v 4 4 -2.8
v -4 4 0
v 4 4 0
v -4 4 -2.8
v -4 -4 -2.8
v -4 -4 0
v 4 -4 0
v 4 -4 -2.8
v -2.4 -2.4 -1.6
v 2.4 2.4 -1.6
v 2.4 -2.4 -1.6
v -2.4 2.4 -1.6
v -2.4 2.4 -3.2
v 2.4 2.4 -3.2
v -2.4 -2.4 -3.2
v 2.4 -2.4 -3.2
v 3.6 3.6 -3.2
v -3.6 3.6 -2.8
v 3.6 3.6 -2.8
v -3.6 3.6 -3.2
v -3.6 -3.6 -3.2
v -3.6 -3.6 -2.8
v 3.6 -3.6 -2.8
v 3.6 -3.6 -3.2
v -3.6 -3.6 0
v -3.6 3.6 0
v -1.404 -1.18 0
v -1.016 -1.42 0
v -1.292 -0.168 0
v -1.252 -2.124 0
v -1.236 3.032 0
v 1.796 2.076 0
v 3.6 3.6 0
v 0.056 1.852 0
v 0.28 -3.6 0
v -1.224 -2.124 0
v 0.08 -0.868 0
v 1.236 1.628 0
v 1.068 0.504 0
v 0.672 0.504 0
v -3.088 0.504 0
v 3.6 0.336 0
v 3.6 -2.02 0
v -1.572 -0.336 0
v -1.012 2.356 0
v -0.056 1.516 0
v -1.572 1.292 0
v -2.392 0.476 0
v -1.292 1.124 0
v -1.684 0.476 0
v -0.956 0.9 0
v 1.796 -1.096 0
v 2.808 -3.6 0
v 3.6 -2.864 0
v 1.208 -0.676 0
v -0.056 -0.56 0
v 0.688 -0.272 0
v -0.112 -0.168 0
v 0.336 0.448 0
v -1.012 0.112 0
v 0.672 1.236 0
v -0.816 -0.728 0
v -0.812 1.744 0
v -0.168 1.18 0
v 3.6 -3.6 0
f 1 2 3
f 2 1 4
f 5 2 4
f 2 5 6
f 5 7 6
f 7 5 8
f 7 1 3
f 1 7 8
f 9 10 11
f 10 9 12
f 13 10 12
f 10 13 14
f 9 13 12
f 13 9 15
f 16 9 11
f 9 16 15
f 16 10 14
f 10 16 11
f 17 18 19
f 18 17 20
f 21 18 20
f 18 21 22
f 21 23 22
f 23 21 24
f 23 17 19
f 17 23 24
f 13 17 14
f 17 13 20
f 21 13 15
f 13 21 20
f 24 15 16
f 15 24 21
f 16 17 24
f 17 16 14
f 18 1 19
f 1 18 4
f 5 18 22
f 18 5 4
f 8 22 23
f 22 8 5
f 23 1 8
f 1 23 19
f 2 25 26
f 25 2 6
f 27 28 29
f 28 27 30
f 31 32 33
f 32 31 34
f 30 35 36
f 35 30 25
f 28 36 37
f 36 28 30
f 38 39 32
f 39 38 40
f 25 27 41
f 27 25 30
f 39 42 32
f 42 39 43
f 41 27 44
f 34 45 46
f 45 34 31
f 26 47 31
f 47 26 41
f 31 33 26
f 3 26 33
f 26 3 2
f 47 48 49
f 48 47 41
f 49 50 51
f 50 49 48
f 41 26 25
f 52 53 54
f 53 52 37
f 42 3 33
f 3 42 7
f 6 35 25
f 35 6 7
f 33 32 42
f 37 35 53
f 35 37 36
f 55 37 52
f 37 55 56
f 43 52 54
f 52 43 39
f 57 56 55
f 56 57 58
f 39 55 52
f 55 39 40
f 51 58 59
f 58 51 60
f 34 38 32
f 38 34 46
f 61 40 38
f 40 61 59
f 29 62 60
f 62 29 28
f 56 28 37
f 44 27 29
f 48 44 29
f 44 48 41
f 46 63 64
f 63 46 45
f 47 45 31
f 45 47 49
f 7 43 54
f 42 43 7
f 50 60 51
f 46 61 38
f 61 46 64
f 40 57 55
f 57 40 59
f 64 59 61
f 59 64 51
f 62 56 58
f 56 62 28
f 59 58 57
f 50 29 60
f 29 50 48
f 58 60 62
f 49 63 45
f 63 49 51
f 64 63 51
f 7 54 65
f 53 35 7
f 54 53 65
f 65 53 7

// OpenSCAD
// file: ../p/4-4edge.scad
use <../lib.scad>
$fa=1; $fs=0.2;
function ldraw_lib__4_4edge(realsolid=false) = [
// 0 Circle 1.0
// 0 Name: 4-4edge.dat
// 0 Author: James Jessiman
// 0 !LDRAW_ORG Primitive UPDATE 2017-01
// 0 !LICENSE Licensed under CC BY 2.0 and CC BY 4.0 : see CAreadme.txt
// 
// 0 BFC CERTIFY CCW
  [0,"BFC","CERTIFY"],
  [0,"BFC","CCW"],
// 
// 0 !HISTORY 1998-12-15 [PTadmin] Official Update 1998-10
// 0 !HISTORY 2005-12-28 [PTadmin] Official Update 2005-01
// 0 !HISTORY 2007-06-24 [PTadmin] Header formatted for Contributor Agreement
// 0 !HISTORY 2008-07-01 [PTadmin] Official Update 2008-01
// 0 !HISTORY 2017-01-15 [Steffen] BFCed
// 0 !HISTORY 2017-12-30 [PTadmin] Official Update 2017-01
// 
// 
// 2 24 1 0 0 0.9239 0 0.3827
  [2,24,1,0,0,0.9239,0,0.3827],
// 2 24 0.9239 0 0.3827 0.7071 0 0.7071
  [2,24,0.9239,0,0.3827,0.7071,0,0.7071],
// 2 24 0.7071 0 0.7071 0.3827 0 0.9239
  [2,24,0.7071,0,0.7071,0.3827,0,0.9239],
// 2 24 0.3827 0 0.9239 0 0 1
  [2,24,0.3827,0,0.9239,0,0,1],
// 2 24 0 0 1 -0.3827 0 0.9239
  [2,24,0,0,1,-0.3827,0,0.9239],
// 2 24 -0.3827 0 0.9239 -0.7071 0 0.7071
  [2,24,-0.3827,0,0.9239,-0.7071,0,0.7071],
// 2 24 -0.7071 0 0.7071 -0.9239 0 0.3827
  [2,24,-0.7071,0,0.7071,-0.9239,0,0.3827],
// 2 24 -0.9239 0 0.3827 -1 0 -0
  [2,24,-0.9239,0,0.3827,-1,0,-0],
// 2 24 -1 0 -0 -0.9239 0 -0.3827
  [2,24,-1,0,-0,-0.9239,0,-0.3827],
// 2 24 -0.9239 0 -0.3827 -0.7071 0 -0.7071
  [2,24,-0.9239,0,-0.3827,-0.7071,0,-0.7071],
// 2 24 -0.7071 0 -0.7071 -0.3827 0 -0.9239
  [2,24,-0.7071,0,-0.7071,-0.3827,0,-0.9239],
// 2 24 -0.3827 0 -0.9239 0 0 -1
  [2,24,-0.3827,0,-0.9239,0,0,-1],
// 2 24 0 0 -1 0.3827 0 -0.9239
  [2,24,0,0,-1,0.3827,0,-0.9239],
// 2 24 0.3827 0 -0.9239 0.7071 0 -0.7071
  [2,24,0.3827,0,-0.9239,0.7071,0,-0.7071],
// 2 24 0.7071 0 -0.7071 0.9239 0 -0.3827
  [2,24,0.7071,0,-0.7071,0.9239,0,-0.3827],
// 2 24 0.9239 0 -0.3827 1 0 0
  [2,24,0.9239,0,-0.3827,1,0,0],
];
module ldraw_lib__4_4edge(step=0, col=false, unit=2/5, alt=false, line=0.2, solid=!$preview)
    makepoly(ldraw_lib__4_4edge(solid), step=step, col=col, unit=unit, alt=alt, line=line, solid=solid);
ldraw_lib__4_4edge(line=0.2);
// file: ../p/4-4disc.scad
use <../lib.scad>
$fa=1; $fs=0.2;
function ldraw_lib__4_4disc(realsolid=false) = [
// 0 Disc 1.0
// 0 Name: 4-4disc.dat
// 0 Author: James Jessiman
// 0 !LDRAW_ORG Primitive UPDATE 2002-02
// 0 !LICENSE Licensed under CC BY 2.0 and CC BY 4.0 : see CAreadme.txt
// 
// 0 BFC CERTIFY CCW
  [0,"BFC","CERTIFY"],
  [0,"BFC","CCW"],
// 
// 0 !HISTORY 1998-12-15 [PTadmin] Official Update 1998-10
// 0 !HISTORY 2002-03-23 [sbliss] Added BFC statement
// 0 !HISTORY 2002-04-25 [PTadmin] Official Update 2002-02
// 0 !HISTORY 2007-06-24 [PTadmin] Header formatted for Contributor Agreement
// 0 !HISTORY 2008-07-01 [PTadmin] Official Update 2008-01
// 
// 
// 3 16 0 0 0 1 0 0 0.9239 0 0.3827
  [3,16,0,0,0,1,0,0,0.9239,0,0.3827],
// 3 16 0 0 0 0.9239 0 0.3827 0.7071 0 0.7071
  [3,16,0,0,0,0.9239,0,0.3827,0.7071,0,0.7071],
// 3 16 0 0 0 0.7071 0 0.7071 0.3827 0 0.9239
  [3,16,0,0,0,0.7071,0,0.7071,0.3827,0,0.9239],
// 3 16 0 0 0 0.3827 0 0.9239 0 0 1
  [3,16,0,0,0,0.3827,0,0.9239,0,0,1],
// 3 16 0 0 0 0 0 1 -0.3827 0 0.9239
  [3,16,0,0,0,0,0,1,-0.3827,0,0.9239],
// 3 16 0 0 0 -0.3827 0 0.9239 -0.7071 0 0.7071
  [3,16,0,0,0,-0.3827,0,0.9239,-0.7071,0,0.7071],
// 3 16 0 0 0 -0.7071 0 0.7071 -0.9239 0 0.3827
  [3,16,0,0,0,-0.7071,0,0.7071,-0.9239,0,0.3827],
// 3 16 0 0 0 -0.9239 0 0.3827 -1 0 -0
  [3,16,0,0,0,-0.9239,0,0.3827,-1,0,-0],
// 3 16 0 0 0 -1 0 -0 -0.9239 0 -0.3827
  [3,16,0,0,0,-1,0,-0,-0.9239,0,-0.3827],
// 3 16 0 0 0 -0.9239 0 -0.3827 -0.7071 0 -0.7071
  [3,16,0,0,0,-0.9239,0,-0.3827,-0.7071,0,-0.7071],
// 3 16 0 0 0 -0.7071 0 -0.7071 -0.3827 0 -0.9239
  [3,16,0,0,0,-0.7071,0,-0.7071,-0.3827,0,-0.9239],
// 3 16 0 0 0 -0.3827 0 -0.9239 0 0 -1
  [3,16,0,0,0,-0.3827,0,-0.9239,0,0,-1],
// 3 16 0 0 0 0 0 -1 0.3827 0 -0.9239
  [3,16,0,0,0,0,0,-1,0.3827,0,-0.9239],
// 3 16 0 0 0 0.3827 0 -0.9239 0.7071 0 -0.7071
  [3,16,0,0,0,0.3827,0,-0.9239,0.7071,0,-0.7071],
// 3 16 0 0 0 0.7071 0 -0.7071 0.9239 0 -0.3827
  [3,16,0,0,0,0.7071,0,-0.7071,0.9239,0,-0.3827],
// 3 16 0 0 0 0.9239 0 -0.3827 1 0 0
  [3,16,0,0,0,0.9239,0,-0.3827,1,0,0],
// 0
];
module ldraw_lib__4_4disc(step=0, col=false, unit=2/5, alt=false, line=0.2, solid=!$preview)
    makepoly(ldraw_lib__4_4disc(solid), step=step, col=col, unit=unit, alt=alt, line=line, solid=solid);
ldraw_lib__4_4disc(line=0.2);
// file: ../p/4-4cyli.scad
use <../lib.scad>
$fa=1; $fs=0.2;
function ldraw_lib__4_4cyli(realsolid=false) = [
// 0 Cylinder 1.0
// 0 Name: 4-4cyli.dat
// 0 Author: James Jessiman
// 0 !LDRAW_ORG Primitive UPDATE 2005-01
// 0 !LICENSE Licensed under CC BY 2.0 and CC BY 4.0 : see CAreadme.txt
// 
// 0 BFC CERTIFY CCW
  [0,"BFC","CERTIFY"],
  [0,"BFC","CCW"],
// 
// 0 !HISTORY 1998-12-15 [PTadmin] Official Update 1998-10
// 0 !HISTORY 2002-03-23 [sbliss] Added BFC statement; merged headers from files in distributions LDraw 0.27 and Complete.
// 0 !HISTORY 2002-04-25 [PTadmin] Official Update 2002-02
// 0 !HISTORY 2004-12-14 [guyvivan] BFC CCW
// 0 !HISTORY 2005-12-28 [PTadmin] Official Update 2005-01
// 0 !HISTORY 2007-06-24 [PTadmin] Header formatted for Contributor Agreement
// 0 !HISTORY 2008-07-01 [PTadmin] Official Update 2008-01
// 
// 
// 4 16 1 1 0 0.9239 1 0.3827 0.9239 0 0.3827 1 0 0
  [4,16,1,1,0,0.9239,1,0.3827,0.9239,0,0.3827,1,0,0],
// 5 24 1 0 0 1 1 0 0.9239 0 0.3827 0.9239 0 -0.3827
  [5,24,1,0,0,1,1,0,0.9239,0,0.3827,0.9239,0,-0.3827],
// 4 16 0.9239 1 0.3827 0.7071 1 0.7071 0.7071 0 0.7071 0.9239 0 0.3827
  [4,16,0.9239,1,0.3827,0.7071,1,0.7071,0.7071,0,0.7071,0.9239,0,0.3827],
// 5 24 0.9239 0 0.3827 0.9239 1 0.3827 0.7071 0 0.7071 1 0 0
  [5,24,0.9239,0,0.3827,0.9239,1,0.3827,0.7071,0,0.7071,1,0,0],
// 4 16 0.7071 1 0.7071 0.3827 1 0.9239 0.3827 0 0.9239 0.7071 0 0.7071
  [4,16,0.7071,1,0.7071,0.3827,1,0.9239,0.3827,0,0.9239,0.7071,0,0.7071],
// 5 24 0.7071 0 0.7071 0.7071 1 0.7071 0.3827 0 0.9239 0.9239 0 0.3827
  [5,24,0.7071,0,0.7071,0.7071,1,0.7071,0.3827,0,0.9239,0.9239,0,0.3827],
// 4 16 0.3827 1 0.9239 0 1 1 0 0 1 0.3827 0 0.9239
  [4,16,0.3827,1,0.9239,0,1,1,0,0,1,0.3827,0,0.9239],
// 5 24 0.3827 0 0.9239 0.3827 1 0.9239 0 0 1 0.7071 0 0.7071
  [5,24,0.3827,0,0.9239,0.3827,1,0.9239,0,0,1,0.7071,0,0.7071],
// 4 16 0 1 1 -0.3827 1 0.9239 -0.3827 0 0.9239 0 0 1
  [4,16,0,1,1,-0.3827,1,0.9239,-0.3827,0,0.9239,0,0,1],
// 5 24 0 0 1 0 1 1 -0.3827 0 0.9239 0.3827 0 0.9239
  [5,24,0,0,1,0,1,1,-0.3827,0,0.9239,0.3827,0,0.9239],
// 4 16 -0.3827 1 0.9239 -0.7071 1 0.7071 -0.7071 0 0.7071 -0.3827 0 0.9239
  [4,16,-0.3827,1,0.9239,-0.7071,1,0.7071,-0.7071,0,0.7071,-0.3827,0,0.9239],
// 5 24 -0.3827 0 0.9239 -0.3827 1 0.9239 -0.7071 0 0.7071 0 0 1
  [5,24,-0.3827,0,0.9239,-0.3827,1,0.9239,-0.7071,0,0.7071,0,0,1],
// 4 16 -0.7071 1 0.7071 -0.9239 1 0.3827 -0.9239 0 0.3827 -0.7071 0 0.7071
  [4,16,-0.7071,1,0.7071,-0.9239,1,0.3827,-0.9239,0,0.3827,-0.7071,0,0.7071],
// 5 24 -0.7071 0 0.7071 -0.7071 1 0.7071 -0.9239 0 0.3827 -0.3827 0 0.9239
  [5,24,-0.7071,0,0.7071,-0.7071,1,0.7071,-0.9239,0,0.3827,-0.3827,0,0.9239],
// 4 16 -0.9239 1 0.3827 -1 1 0 -1 0 0 -0.9239 0 0.3827
  [4,16,-0.9239,1,0.3827,-1,1,0,-1,0,0,-0.9239,0,0.3827],
// 5 24 -0.9239 0 0.3827 -0.9239 1 0.3827 -1 0 0 -0.7071 0 0.7071
  [5,24,-0.9239,0,0.3827,-0.9239,1,0.3827,-1,0,0,-0.7071,0,0.7071],
// 4 16 -1 1 0 -0.9239 1 -0.3827 -0.9239 0 -0.3827 -1 0 0
  [4,16,-1,1,0,-0.9239,1,-0.3827,-0.9239,0,-0.3827,-1,0,0],
// 5 24 -1 0 0 -1 1 0 -0.9239 0 -0.3827 -0.9239 0 0.3827
  [5,24,-1,0,0,-1,1,0,-0.9239,0,-0.3827,-0.9239,0,0.3827],
// 4 16 -0.9239 1 -0.3827 -0.7071 1 -0.7071 -0.7071 0 -0.7071 -0.9239 0 -0.3827
  [4,16,-0.9239,1,-0.3827,-0.7071,1,-0.7071,-0.7071,0,-0.7071,-0.9239,0,-0.3827],
// 5 24 -0.9239 0 -0.3827 -0.9239 1 -0.3827 -0.7071 0 -0.7071 -1 0 0
  [5,24,-0.9239,0,-0.3827,-0.9239,1,-0.3827,-0.7071,0,-0.7071,-1,0,0],
// 4 16 -0.7071 1 -0.7071 -0.3827 1 -0.9239 -0.3827 0 -0.9239 -0.7071 0 -0.7071
  [4,16,-0.7071,1,-0.7071,-0.3827,1,-0.9239,-0.3827,0,-0.9239,-0.7071,0,-0.7071],
// 5 24 -0.7071 0 -0.7071 -0.7071 1 -0.7071 -0.3827 0 -0.9239 -0.9239 0 -0.3827
  [5,24,-0.7071,0,-0.7071,-0.7071,1,-0.7071,-0.3827,0,-0.9239,-0.9239,0,-0.3827],
// 4 16 -0.3827 1 -0.9239 0 1 -1 0 0 -1 -0.3827 0 -0.9239
  [4,16,-0.3827,1,-0.9239,0,1,-1,0,0,-1,-0.3827,0,-0.9239],
// 5 24 -0.3827 0 -0.9239 -0.3827 1 -0.9239 0 0 -1 -0.7071 0 -0.7071
  [5,24,-0.3827,0,-0.9239,-0.3827,1,-0.9239,0,0,-1,-0.7071,0,-0.7071],
// 4 16 0 1 -1 0.3827 1 -0.9239 0.3827 0 -0.9239 0 0 -1
  [4,16,0,1,-1,0.3827,1,-0.9239,0.3827,0,-0.9239,0,0,-1],
// 5 24 0 0 -1 0 1 -1 0.3827 0 -0.9239 -0.3827 0 -0.9239
  [5,24,0,0,-1,0,1,-1,0.3827,0,-0.9239,-0.3827,0,-0.9239],
// 4 16 0.3827 1 -0.9239 0.7071 1 -0.7071 0.7071 0 -0.7071 0.3827 0 -0.9239
  [4,16,0.3827,1,-0.9239,0.7071,1,-0.7071,0.7071,0,-0.7071,0.3827,0,-0.9239],
// 5 24 0.3827 0 -0.9239 0.3827 1 -0.9239 0.7071 0 -0.7071 0 0 -1
  [5,24,0.3827,0,-0.9239,0.3827,1,-0.9239,0.7071,0,-0.7071,0,0,-1],
// 4 16 0.7071 1 -0.7071 0.9239 1 -0.3827 0.9239 0 -0.3827 0.7071 0 -0.7071
  [4,16,0.7071,1,-0.7071,0.9239,1,-0.3827,0.9239,0,-0.3827,0.7071,0,-0.7071],
// 5 24 0.7071 0 -0.7071 0.7071 1 -0.7071 0.9239 0 -0.3827 0.3827 0 -0.9239
  [5,24,0.7071,0,-0.7071,0.7071,1,-0.7071,0.9239,0,-0.3827,0.3827,0,-0.9239],
// 4 16 0.9239 1 -0.3827 1 1 0 1 0 0 0.9239 0 -0.3827
  [4,16,0.9239,1,-0.3827,1,1,0,1,0,0,0.9239,0,-0.3827],
// 5 24 0.9239 0 -0.3827 0.9239 1 -0.3827 1 0 0 0.7071 0 -0.7071
  [5,24,0.9239,0,-0.3827,0.9239,1,-0.3827,1,0,0,0.7071,0,-0.7071],
// 0
];
module ldraw_lib__4_4cyli(step=0, col=false, unit=2/5, alt=false, line=0.2, solid=!$preview)
    makepoly(ldraw_lib__4_4cyli(solid), step=step, col=col, unit=unit, alt=alt, line=line, solid=solid);
ldraw_lib__4_4cyli(line=0.2);
// file: ../p/stud3.scad
use <../lib.scad>
use <4-4cyli.scad>
use <4-4disc.scad>
use <4-4edge.scad>
$fa=1; $fs=0.2;
function ldraw_lib__stud3(realsolid=false) = realsolid ? 
    [openscad(translate([0,0,-eps()], o=cylinder(4+eps(), r=4)),2)] : [
// 0 Stud Tube Solid
// 0 Name: stud3.dat
// 0 Author: James Jessiman
// 0 !LDRAW_ORG Primitive UPDATE 2012-01
// 0 !LICENSE Licensed under CC BY 2.0 and CC BY 4.0 : see CAreadme.txt
// 
// 0 BFC CERTIFY CCW
  [0,"BFC","CERTIFY"],
  [0,"BFC","CCW"],
// 
// 0 !HISTORY 2002-04-04 [sbliss] Modified for BFC compliance
// 0 !HISTORY 2002-04-25 [PTadmin] Official Update 2002-02
// 0 !HISTORY 2007-06-24 [PTadmin] Header formatted for Contributor Agreement
// 0 !HISTORY 2008-07-01 [PTadmin] Official Update 2008-01
// 0 !HISTORY 2012-02-16 [Philo] Changed to CCW
// 0 !HISTORY 2012-03-30 [PTadmin] Official Update 2012-01
// 
// 
// 1 16 0 -4 0 4 0 0 0 1 0 0 0 4 4-4edge.dat
  [1,16,0,-4,0,4,0,0,0,1,0,0,0,4, ldraw_lib__4_4edge(realsolid)],
// 1 16 0 0 0 4 0 0 0 1 0 0 0 4 4-4edge.dat
  [1,16,0,0,0,4,0,0,0,1,0,0,0,4, ldraw_lib__4_4edge(realsolid)],
// 1 16 0 -4 0 4 0 0 0 1 0 0 0 4 4-4disc.dat
  [1,16,0,-4,0,4,0,0,0,1,0,0,0,4, ldraw_lib__4_4disc(realsolid)],
// 1 16 0 -4 0 4 0 0 0 4 0 0 0 4 4-4cyli.dat
  [1,16,0,-4,0,4,0,0,0,4,0,0,0,4, ldraw_lib__4_4cyli(realsolid)],
];
module ldraw_lib__stud3(step=0, col=false, unit=2/5, alt=false, line=0.2, solid=!$preview)
    makepoly(ldraw_lib__stud3(solid), step=step, col=col, unit=unit, alt=alt, line=line, solid=solid);
ldraw_lib__stud3(line=0.2);
// file: ../p/stud.scad
use <../lib.scad>
use <4-4cyli.scad>
use <4-4disc.scad>
use <4-4edge.scad>
$fa=1; $fs=0.2;
function ldraw_lib__stud(realsolid=false) = realsolid ? 
    [openscad(translate([0,0,-eps()], o=cylinder(4+eps(), r=6)),2)] : [
// 0 Stud
// 0 Name: stud.dat
// 0 Author: James Jessiman
// 0 !LDRAW_ORG Primitive UPDATE 2012-01
// 0 !LICENSE Licensed under CC BY 2.0 and CC BY 4.0 : see CAreadme.txt
// 
// 0 BFC CERTIFY CCW
  [0,"BFC","CERTIFY"],
  [0,"BFC","CCW"],
// 
// 0 !HISTORY 2002-04-04 [sbliss] Modified for BFC compliance
// 0 !HISTORY 2002-04-25 [PTadmin] Official Update 2002-02
// 0 !HISTORY 2007-06-24 [PTadmin] Header formatted for Contributor Agreement
// 0 !HISTORY 2008-07-01 [PTadmin] Official Update 2008-01
// 0 !HISTORY 2012-02-16 [Philo] Changed to CCW
// 0 !HISTORY 2012-03-30 [PTadmin] Official Update 2012-01
// 
// 
// 1 16 0 0 0 6 0 0 0 1 0 0 0 6 4-4edge.dat
  [1,16,0,0,0,6,0,0,0,1,0,0,0,6, ldraw_lib__4_4edge(realsolid)],
// 1 16 0 -4 0 6 0 0 0 1 0 0 0 6 4-4edge.dat
  [1,16,0,-4,0,6,0,0,0,1,0,0,0,6, ldraw_lib__4_4edge(realsolid)],
// 1 16 0 0 0 6 0 0 0 -4 0 0 0 6 4-4cyli.dat
  [1,16,0,0,0,6,0,0,0,-4,0,0,0,6, ldraw_lib__4_4cyli(realsolid)],
// 1 16 0 -4 0 6 0 0 0 1 0 0 0 6 4-4disc.dat
  [1,16,0,-4,0,6,0,0,0,1,0,0,0,6, ldraw_lib__4_4disc(realsolid)],
];
module ldraw_lib__stud(step=0, col=false, unit=2/5, alt=false, line=0.2, solid=!$preview)
    makepoly(ldraw_lib__stud(solid), step=step, col=col, unit=unit, alt=alt, line=line, solid=solid);
ldraw_lib__stud(line=0.2);
// file: ../p/box4t.scad
use <../lib.scad>
$fa=1; $fs=0.2;
function ldraw_lib__box4t(realsolid=false) = [
// 0 Box with 4 Adjacent Faces and All Edges
// 0 Name: box4t.dat
// 0 Author: Tore Eriksson [Tore_Eriksson]
// 0 !LDRAW_ORG Primitive UPDATE 2003-02
// 0 !LICENSE Licensed under CC BY 2.0 and CC BY 4.0 : see CAreadme.txt
// 
// 0 BFC CERTIFY CCW
  [0,"BFC","CERTIFY"],
  [0,"BFC","CCW"],
// 
// 0 !HISTORY 1997-09-29 [PTadmin] Official Update 1997-15
// 0 !HISTORY 2002-08-31 [izanette] Modified with WINDZ for BFC compliance
// 0 !HISTORY 2003-08-01 [PTadmin] Official Update 2003-02
// 0 !HISTORY 2007-06-24 [PTadmin] Header formatted for Contributor Agreement
// 0 !HISTORY 2008-07-01 [PTadmin] Official Update 2008-01
// 
// 
// 2 24 1 1 1 -1 1 1
  [2,24,1,1,1,-1,1,1],
// 2 24 -1 1 1 -1 1 -1
  [2,24,-1,1,1,-1,1,-1],
// 2 24 -1 1 -1 1 1 -1
  [2,24,-1,1,-1,1,1,-1],
// 2 24 1 1 -1 1 1 1
  [2,24,1,1,-1,1,1,1],
// 2 24 1 0 1 -1 0 1
  [2,24,1,0,1,-1,0,1],
// 2 24 -1 0 1 -1 0 -1
  [2,24,-1,0,1,-1,0,-1],
// 2 24 -1 0 -1 1 0 -1
  [2,24,-1,0,-1,1,0,-1],
// 2 24 1 0 -1 1 0 1
  [2,24,1,0,-1,1,0,1],
// 2 24 1 0 1 1 1 1
  [2,24,1,0,1,1,1,1],
// 2 24 -1 0 1 -1 1 1
  [2,24,-1,0,1,-1,1,1],
// 2 24 1 0 -1 1 1 -1
  [2,24,1,0,-1,1,1,-1],
// 2 24 -1 0 -1 -1 1 -1
  [2,24,-1,0,-1,-1,1,-1],
// 4 16 1 1 1 1 1 -1 -1 1 -1 -1 1 1
  [4,16,1,1,1,1,1,-1,-1,1,-1,-1,1,1],
// 4 16 1 1 1 -1 1 1 -1 0 1 1 0 1
  [4,16,1,1,1,-1,1,1,-1,0,1,1,0,1],
// 4 16 -1 1 1 -1 1 -1 -1 0 -1 -1 0 1
  [4,16,-1,1,1,-1,1,-1,-1,0,-1,-1,0,1],
// 0 4 16 -1 1 -1 -1 0 -1 1 0 -1 1 1 -1
// 4 16 1 1 -1 1 1 1 1 0 1 1 0 -1
  [4,16,1,1,-1,1,1,1,1,0,1,1,0,-1],
// 0
];
module ldraw_lib__box4t(step=0, col=false, unit=2/5, alt=false, line=0.2, solid=!$preview)
    makepoly(ldraw_lib__box4t(solid), step=step, col=col, unit=unit, alt=alt, line=line, solid=solid);
ldraw_lib__box4t(line=0.2);
// file: s/3004s01.scad
use <../../lib.scad>
use <../../p/box4t.scad>
use <../../p/box5.scad>
use <../../p/stud.scad>
use <../../p/stud3.scad>
$fa=1; $fs=0.2;
function ldraw_lib__s__3004s01(realsolid=false) = [
// 0 ~Brick  1 x  2 without Front Face
// 0 Name: s\3004s01.dat
// 0 Author: James Jessiman
// 0 !LDRAW_ORG Subpart UPDATE 2003-03
// 0 !LICENSE Licensed under CC BY 2.0 and CC BY 4.0 : see CAreadme.txt
// 
// 0 BFC CERTIFY CCW
  [0,"BFC","CERTIFY"],
  [0,"BFC","CCW"],
// 
// 0 !HISTORY 2003-09-07 [jriley] Subfiling, BFC
// 0 !HISTORY 2003-12-19 [PTadmin] Official Update 2003-03
// 0 !HISTORY 2007-08-29 [PTadmin] Header formatted for Contributor Agreement
// 0 !HISTORY 2008-07-01 [PTadmin] Official Update 2008-01
// 
// 
// 1 16 0 4 0 1 0 0 0 -5 0 0 0 1 stud3.dat
  [1,16,0,4,0,1,0,0,0,-5,0,0,0,1, ldraw_lib__stud3(realsolid)],
// 0 BFC INVERTNEXT
  [0,"BFC","INVERTNEXT"],
// 1 16 0 24 0 16 0 0 0 -20 0 0 0 6 box5.dat
  [1,16,0,24,0,16,0,0,0,-20,0,0,0,6, ldraw_lib__box5(realsolid)],
// 4 16 20 24 10 16 24 6 -16 24 6 -20 24 10
  [4,16,20,24,10,16,24,6,-16,24,6,-20,24,10],
// 4 16 -20 24 10 -16 24 6 -16 24 -6 -20 24 -10
  [4,16,-20,24,10,-16,24,6,-16,24,-6,-20,24,-10],
// 4 16 -20 24 -10 -16 24 -6 16 24 -6 20 24 -10
  [4,16,-20,24,-10,-16,24,-6,16,24,-6,20,24,-10],
// 4 16 20 24 -10 16 24 -6 16 24 6 20 24 10
  [4,16,20,24,-10,16,24,-6,16,24,6,20,24,10],
// 1 16 0 24 0 20 0 0 0 -24 0 0 0 10 box4t.dat
  [1,16,0,24,0,20,0,0,0,-24,0,0,0,10, ldraw_lib__box4t(realsolid)],
// 1 16 10 0 0 1 0 0 0 1 0 0 0 1 stud.dat
  [1,16,10,0,0,1,0,0,0,1,0,0,0,1, ldraw_lib__stud(realsolid)],
// 1 16 -10 0 0 1 0 0 0 1 0 0 0 1 stud.dat
  [1,16,-10,0,0,1,0,0,0,1,0,0,0,1, ldraw_lib__stud(realsolid)],
// 0
];
module ldraw_lib__s__3004s01(step=0, col=false, unit=2/5, alt=false, line=0.2, solid=!$preview)
    makepoly(ldraw_lib__s__3004s01(solid), step=step, col=col, unit=unit, alt=alt, line=line, solid=solid);
ldraw_lib__s__3004s01(line=0.2);
// file: ../p/box5.scad
use <../lib.scad>
$fa=1; $fs=0.2;
function ldraw_lib__box5(realsolid=false) = [
// 0 Box with 5 Faces and All Edges
// 0 Name: box5.dat
// 0 Author: James Jessiman
// 0 !LDRAW_ORG Primitive UPDATE 2012-01
// 0 !LICENSE Licensed under CC BY 2.0 and CC BY 4.0 : see CAreadme.txt
// 
// 0 BFC CERTIFY CCW
  [0,"BFC","CERTIFY"],
  [0,"BFC","CCW"],
// 
// 0 !HISTORY 2002-04-03 [sbliss] Modified for BFC compliance
// 0 !HISTORY 2002-04-25 [PTadmin] Official Update 2002-02
// 0 !HISTORY 2007-06-24 [PTadmin] Header formatted for Contributor Agreement
// 0 !HISTORY 2008-07-01 [PTadmin] Official Update 2008-01
// 0 !HISTORY 2012-02-16 [Philo] Changed to CCW
// 0 !HISTORY 2012-03-30 [PTadmin] Official Update 2012-01
// 
// 
// 2 24 1 1 1 -1 1 1
  [2,24,1,1,1,-1,1,1],
// 2 24 -1 1 1 -1 1 -1
  [2,24,-1,1,1,-1,1,-1],
// 2 24 -1 1 -1 1 1 -1
  [2,24,-1,1,-1,1,1,-1],
// 2 24 1 1 -1 1 1 1
  [2,24,1,1,-1,1,1,1],
// 2 24 1 0 1 -1 0 1
  [2,24,1,0,1,-1,0,1],
// 2 24 -1 0 1 -1 0 -1
  [2,24,-1,0,1,-1,0,-1],
// 2 24 -1 0 -1 1 0 -1
  [2,24,-1,0,-1,1,0,-1],
// 2 24 1 0 -1 1 0 1
  [2,24,1,0,-1,1,0,1],
// 2 24 1 0 1 1 1 1
  [2,24,1,0,1,1,1,1],
// 2 24 -1 0 1 -1 1 1
  [2,24,-1,0,1,-1,1,1],
// 2 24 1 0 -1 1 1 -1
  [2,24,1,0,-1,1,1,-1],
// 2 24 -1 0 -1 -1 1 -1
  [2,24,-1,0,-1,-1,1,-1],
// 4 16 -1 1 1 1 1 1 1 1 -1 -1 1 -1
  [4,16,-1,1,1,1,1,1,1,1,-1,-1,1,-1],
// 4 16 -1 1 1 -1 0 1 1 0 1 1 1 1
  [4,16,-1,1,1,-1,0,1,1,0,1,1,1,1],
// 4 16 -1 1 -1 -1 0 -1 -1 0 1 -1 1 1
  [4,16,-1,1,-1,-1,0,-1,-1,0,1,-1,1,1],
// 4 16 1 1 -1 1 0 -1 -1 0 -1 -1 1 -1
  [4,16,1,1,-1,1,0,-1,-1,0,-1,-1,1,-1],
// 4 16 1 1 1 1 0 1 1 0 -1 1 1 -1
  [4,16,1,1,1,1,0,1,1,0,-1,1,1,-1],
];
module ldraw_lib__box5(step=0, col=false, unit=2/5, alt=false, line=0.2, solid=!$preview)
    makepoly(ldraw_lib__box5(solid), step=step, col=col, unit=unit, alt=alt, line=line, solid=solid);
ldraw_lib__box5(line=0.2);
// file: ../p/box4.scad
use <../lib.scad>
$fa=1; $fs=0.2;
function ldraw_lib__box4(realsolid=false) = [
// 0 Box with 4 Faces (2 Parallel Pairs) and All Edges
// 0 Name: box4.dat
// 0 Author: James Jessiman
// 0 !LDRAW_ORG Primitive UPDATE 2012-01
// 0 !LICENSE Licensed under CC BY 2.0 and CC BY 4.0 : see CAreadme.txt
// 
// 0 BFC CERTIFY CCW
  [0,"BFC","CERTIFY"],
  [0,"BFC","CCW"],
// 
// 0 !HISTORY 2002-04-03 [sbliss] Modified for BFC compliance
// 0 !HISTORY 2002-04-25 [PTadmin] Official Update 2002-02
// 0 !HISTORY 2007-06-24 [PTadmin] Header formatted for Contributor Agreement
// 0 !HISTORY 2008-07-01 [PTadmin] Official Update 2008-01
// 0 !HISTORY 2012-02-16 [Philo] Changed to CCW
// 0 !HISTORY 2012-03-30 [PTadmin] Official Update 2012-01
// 
// 
// 2 24 1 1 1 -1 1 1
  [2,24,1,1,1,-1,1,1],
// 2 24 -1 1 1 -1 1 -1
  [2,24,-1,1,1,-1,1,-1],
// 2 24 -1 1 -1 1 1 -1
  [2,24,-1,1,-1,1,1,-1],
// 2 24 1 1 -1 1 1 1
  [2,24,1,1,-1,1,1,1],
// 2 24 1 0 1 -1 0 1
  [2,24,1,0,1,-1,0,1],
// 2 24 -1 0 1 -1 0 -1
  [2,24,-1,0,1,-1,0,-1],
// 2 24 -1 0 -1 1 0 -1
  [2,24,-1,0,-1,1,0,-1],
// 2 24 1 0 -1 1 0 1
  [2,24,1,0,-1,1,0,1],
// 2 24 1 0 1 1 1 1
  [2,24,1,0,1,1,1,1],
// 2 24 -1 0 1 -1 1 1
  [2,24,-1,0,1,-1,1,1],
// 2 24 1 0 -1 1 1 -1
  [2,24,1,0,-1,1,1,-1],
// 2 24 -1 0 -1 -1 1 -1
  [2,24,-1,0,-1,-1,1,-1],
// 4 16 -1 1 1 -1 0 1 1 0 1 1 1 1
  [4,16,-1,1,1,-1,0,1,1,0,1,1,1,1],
// 4 16 -1 1 -1 -1 0 -1 -1 0 1 -1 1 1
  [4,16,-1,1,-1,-1,0,-1,-1,0,1,-1,1,1],
// 4 16 1 1 -1 1 0 -1 -1 0 -1 -1 1 -1
  [4,16,1,1,-1,1,0,-1,-1,0,-1,-1,1,-1],
// 4 16 1 1 1 1 0 1 1 0 -1 1 1 -1
  [4,16,1,1,1,1,0,1,1,0,-1,1,1,-1],
];
module ldraw_lib__box4(step=0, col=false, unit=2/5, alt=false, line=0.2, solid=!$preview)
    makepoly(ldraw_lib__box4(solid), step=step, col=col, unit=unit, alt=alt, line=line, solid=solid);
ldraw_lib__box4(line=0.2);
// file: 3004.scad
use <../lib.scad>
use <s/3004s01.scad>
$fa=1; $fs=0.2;
function ldraw_lib__3004(realsolid=false) = [
// 0 Brick  1 x  2
// 0 Name: 3004.dat
// 0 Author: James Jessiman
// 0 !LDRAW_ORG Part UPDATE 2022-05
// 0 !LICENSE Licensed under CC BY 2.0 and CC BY 4.0 : see CAreadme.txt
// 
// 0 BFC CERTIFY CCW
  [0,"BFC","CERTIFY"],
  [0,"BFC","CCW"],
// 
// 0 !HISTORY 2001-10-26 [PTadmin] Official Update 2001-01
// 0 !HISTORY 2002-05-07 {unknown} BFC Certification
// 0 !HISTORY 2002-06-11 [PTadmin] Official Update 2002-03
// 0 !HISTORY 2007-05-07 [PTadmin] Header formatted for Contributor Agreement
// 0 !HISTORY 2008-07-01 [PTadmin] Official Update 2008-01
// 0 !HISTORY 2022-08-04 [MagFors] Using subfile
// 0 !HISTORY 2022-09-15 [PTadmin] Official Update 2022-05
// 
// 
// 1 16 0 0 0 1 0 0 0 1 0 0 0 1 s\3004s01.dat
  [1,16,0,0,0,1,0,0,0,1,0,0,0,1, ldraw_lib__s__3004s01(realsolid)],
// 4 16 -20 24 -10 20 24 -10 20 0 -10 -20 0 -10
  [4,16,-20,24,-10,20,24,-10,20,0,-10,-20,0,-10],
];
module ldraw_lib__3004(step=0, col=false, unit=2/5, alt=false, line=0.2, solid=!$preview)
    makepoly(ldraw_lib__3004(solid), step=step, col=col, unit=unit, alt=alt, line=line, solid=solid);
ldraw_lib__3004(line=0.2);
// file: s/3070bs01.scad
use <../../lib.scad>
use <../../p/box4.scad>
use <../../p/box5.scad>
$fa=1; $fs=0.2;
function ldraw_lib__s__3070bs01(realsolid=false) = [
// 0 ~Tile  1 x  1 with Groove without Top Face
// 0 Name: s\3070bs01.dat
// 0 Author: Chris Dee [cwdee]
// 0 !LDRAW_ORG Subpart UPDATE 2009-02
// 0 !LICENSE Licensed under CC BY 2.0 and CC BY 4.0 : see CAreadme.txt
// 
// 0 BFC CERTIFY CCW
  [0,"BFC","CERTIFY"],
  [0,"BFC","CCW"],
// 
// 0 !HISTORY 2009-09-03 [PTadmin] Official Update 2009-02
// 
// 
// 1 16 0 0 0 10 0 0 0 7 0 0 0 10 box4.dat
  [1,16,0,0,0,10,0,0,0,7,0,0,0,10, ldraw_lib__box4(realsolid)],
// 0 BFC INVERTNEXT
  [0,"BFC","INVERTNEXT"],
// 1 16 0 8 0 6 0 0 0 -4 0 0 0 6 box5.dat
  [1,16,0,8,0,6,0,0,0,-4,0,0,0,6, ldraw_lib__box5(realsolid)],
// 1 16 0 7 0 9 0 0 0 1 0 0 0 9 box4.dat
  [1,16,0,7,0,9,0,0,0,1,0,0,0,9, ldraw_lib__box4(realsolid)],
// 
// 4 16 9 8 9 6 8 6 -6 8 6 -9 8 9
  [4,16,9,8,9,6,8,6,-6,8,6,-9,8,9],
// 4 16 -9 8 9 -6 8 6 -6 8 -6 -9 8 -9
  [4,16,-9,8,9,-6,8,6,-6,8,-6,-9,8,-9],
// 4 16 -9 8 -9 -6 8 -6 6 8 -6 9 8 -9
  [4,16,-9,8,-9,-6,8,-6,6,8,-6,9,8,-9],
// 4 16 9 8 -9 6 8 -6 6 8 6 9 8 9
  [4,16,9,8,-9,6,8,-6,6,8,6,9,8,9],
// 
// 4 16 10 7 10 9 7 9 -9 7 9 -10 7 10
  [4,16,10,7,10,9,7,9,-9,7,9,-10,7,10],
// 4 16 -10 7 10 -9 7 9 -9 7 -9 -10 7 -10
  [4,16,-10,7,10,-9,7,9,-9,7,-9,-10,7,-10],
// 4 16 -10 7 -10 -9 7 -9 9 7 -9 10 7 -10
  [4,16,-10,7,-10,-9,7,-9,9,7,-9,10,7,-10],
// 4 16 10 7 -10 9 7 -9 9 7 9 10 7 10
  [4,16,10,7,-10,9,7,-9,9,7,9,10,7,10],
// 0
];
module ldraw_lib__s__3070bs01(step=0, col=false, unit=2/5, alt=false, line=0.2, solid=!$preview)
    makepoly(ldraw_lib__s__3070bs01(solid), step=step, col=col, unit=unit, alt=alt, line=line, solid=solid);
ldraw_lib__s__3070bs01(line=0.2);
// main file
use <../lib.scad>
use <s/3070bs01.scad>
$fa=1; $fs=0.2;
function ldraw_lib__3070bp0s(realsolid=false) = [
// 0 Tile  1 x  1 with Rising Star on Blue Background Pattern
// 0 Name: 3070bp0s.dat
// 0 Author: Philippe Hurbain [Philo]
// 0 !LDRAW_ORG Part UPDATE 2020-03
// 0 !LICENSE Licensed under CC BY 2.0 and CC BY 4.0 : see CAreadme.txt
// 
// 0 BFC CERTIFY CCW
  [0,"BFC","CERTIFY"],
  [0,"BFC","CCW"],
// 
// 0 !KEYWORDS Bricklink 3070bpb152, Dots, Set 41916
// 
// 0 !HISTORY 2020-12-29 [PTadmin] Official Update 2020-03
// 
// 
// 1 16 0 0 0 1 0 0 0 1 0 0 0 1 s\3070bs01.dat
  [1,16,0,0,0,1,0,0,0,1,0,0,0,1, ldraw_lib__s__3070bs01(realsolid)],
// 4 16 -9 0 -9 -9 0 9 -10 0 10 -10 0 -10
  [4,16,-9,0,-9,-9,0,9,-10,0,10,-10,0,-10],
// 4 353 -2.54 0 -3.55 -3.23 0 -0.42 -3.51 0 -2.95 -3.13 0 -5.31
  [4,353,-2.54,0,-3.55,-3.23,0,-0.42,-3.51,0,-2.95,-3.13,0,-5.31],
// 4 1 4.49 0 5.19 9 0 9 -3.09 0 7.58 0.14 0 4.63
  [4,1,4.49,0,5.19,9,0,9,-3.09,0,7.58,0.14,0,4.63],
// 4 1 0.7 0 -9 -3.06 0 -5.31 -3.13 0 -5.31 -9 0 -9
  [4,1,0.7,0,-9,-3.06,0,-5.31,-3.13,0,-5.31,-9,0,-9],
// 4 353 -2.54 0 -3.55 -3.13 0 -5.31 -3.06 0 -5.31 0.2 0 -2.17
  [4,353,-2.54,0,-3.55,-3.13,0,-5.31,-3.06,0,-5.31,0.2,0,-2.17],
// 4 353 2.67 0 1.26 4.49 0 5.19 3.09 0 4.07 1.68 0 1.26
  [4,353,2.67,0,1.26,4.49,0,5.19,3.09,0,4.07,1.68,0,1.26],
// 4 1 -3.51 0 -2.95 -7.72 0 1.26 -9 0 -9 -3.13 0 -5.31
  [4,1,-3.51,0,-2.95,-7.72,0,1.26,-9,0,-9,-3.13,0,-5.31],
// 4 3 2.67 0 1.26 9 0 -5.05 9 0 0.84 4.49 0 5.19
  [4,3,2.67,0,1.26,9,0,-5.05,9,0,0.84,4.49,0,5.19],
// 3 3 -7.72 0 1.26 -3.51 0 -2.95 -3.93 0 -0.84
  [3,3,-7.72,0,1.26,-3.51,0,-2.95,-3.93,0,-0.84],
// 4 353 -2.53 0 5.89 -0.14 0 3.79 0.14 0 4.63 -3.09 0 7.58
  [4,353,-2.53,0,5.89,-0.14,0,3.79,0.14,0,4.63,-3.09,0,7.58],
// 4 1 -3.93 0 3.23 -3.09 0 7.58 -9 0 9 -7.72 0 1.26
  [4,1,-3.93,0,3.23,-3.09,0,7.58,-9,0,9,-7.72,0,1.26],
// 3 1 -3.09 0 7.58 9 0 9 -9 0 9
  [3,1,-3.09,0,7.58,9,0,9,-9,0,9],
// 4 16 -9 0 9 9 0 9 10 0 10 -10 0 10
  [4,16,-9,0,9,9,0,9,10,0,10,-10,0,10],
// 4 353 -3.93 0 3.23 -7.72 0 1.26 -5.98 0 1.19 -3.23 0 2.81
  [4,353,-3.93,0,3.23,-7.72,0,1.26,-5.98,0,1.19,-3.23,0,2.81],
// 4 14 -3.23 0 2.81 -5.98 0 1.19 -4.21 0 1.19 -2.39 0 2.25
  [4,14,-3.23,0,2.81,-5.98,0,1.19,-4.21,0,1.19,-2.39,0,2.25],
// 3 1 -7.72 0 1.26 -9 0 9 -9 0 -9
  [3,1,-7.72,0,1.26,-9,0,9,-9,0,-9],
// 4 3 4.49 0 -2.74 0.2 0 -2.17 7.02 0 -9 9 0 -7.16
  [4,3,4.49,0,-2.74,0.2,0,-2.17,7.02,0,-9,9,0,-7.16],
// 4 16 9 0 0.84 10 0 -10 10 0 10 9 0 9
  [4,16,9,0,0.84,10,0,-10,10,0,10,9,0,9],
// 4 16 0.7 0 -9 -9 0 -9 -10 0 -10 10 0 -10
  [4,16,0.7,0,-9,-9,0,-9,-10,0,-10,10,0,-10],
// 3 1 9 0 9 4.49 0 5.19 9 0 0.84
  [3,1,9,0,9,4.49,0,5.19,9,0,0.84],
// 4 16 0.2 0 -2.17 -3.06 0 -5.31 0.7 0 -9 7.02 0 -9
  [4,16,0.2,0,-2.17,-3.06,0,-5.31,0.7,0,-9,7.02,0,-9],
// 4 353 0.2 0 -2.17 4.49 0 -2.74 3.02 0 -1.69 -0.14 0 -1.4
  [4,353,0.2,0,-2.17,4.49,0,-2.74,3.02,0,-1.69,-0.14,0,-1.4],
// 4 16 4.49 0 -2.74 9 0 -7.16 9 0 -5.05 2.67 0 1.26
  [4,16,4.49,0,-2.74,9,0,-7.16,9,0,-5.05,2.67,0,1.26],
// 4 14 -0.14 0 -1.4 3.02 0 -1.69 1.72 0 -0.68 -0.28 0 -0.42
  [4,14,-0.14,0,-1.4,3.02,0,-1.69,1.72,0,-0.68,-0.28,0,-0.42],
// 4 353 3.02 0 -1.69 4.49 0 -2.74 2.67 0 1.26 1.68 0 1.26
  [4,353,3.02,0,-1.69,4.49,0,-2.74,2.67,0,1.26,1.68,0,1.26],
// 4 16 -0.28 0 -0.42 0.84 0 1.12 -2.39 0 2.25 -2.53 0 0.28
  [4,16,-0.28,0,-0.42,0.84,0,1.12,-2.39,0,2.25,-2.53,0,0.28],
// 4 353 3.09 0 4.07 4.49 0 5.19 0.14 0 4.63 -0.14 0 3.79
  [4,353,3.09,0,4.07,4.49,0,5.19,0.14,0,4.63,-0.14,0,3.79],
// 4 14 1.68 0 1.26 3.09 0 4.07 1.68 0 3.09 0.84 0 1.12
  [4,14,1.68,0,1.26,3.09,0,4.07,1.68,0,3.09,0.84,0,1.12],
// 4 14 -3.23 0 -0.42 -2.54 0 -3.55 -2.04 0 -1.82 -2.53 0 0.28
  [4,14,-3.23,0,-0.42,-2.54,0,-3.55,-2.04,0,-1.82,-2.53,0,0.28],
// 3 353 -0.14 0 -1.4 -2.54 0 -3.55 0.2 0 -2.17
  [3,353,-0.14,0,-1.4,-2.54,0,-3.55,0.2,0,-2.17],
// 3 353 -3.93 0 -0.84 -3.51 0 -2.95 -3.23 0 -0.42
  [3,353,-3.93,0,-0.84,-3.51,0,-2.95,-3.23,0,-0.42],
// 4 353 -5.98 0 1.19 -7.72 0 1.26 -3.93 0 -0.84 -3.23 0 -0.42
  [4,353,-5.98,0,1.19,-7.72,0,1.26,-3.93,0,-0.84,-3.23,0,-0.42],
// 4 14 -0.14 0 3.79 -2.53 0 5.89 -2.03 0 4.36 -0.42 0 2.95
  [4,14,-0.14,0,3.79,-2.53,0,5.89,-2.03,0,4.36,-0.42,0,2.95],
// 4 353 -2.53 0 5.89 -3.09 0 7.58 -3.93 0 3.23 -3.23 0 2.81
  [4,353,-2.53,0,5.89,-3.09,0,7.58,-3.93,0,3.23,-3.23,0,2.81],
// 3 16 10 0 -10 9 0 -5.05 9 0 -7.16
  [3,16,10,0,-10,9,0,-5.05,9,0,-7.16],
// 3 16 9 0 0.84 9 0 -5.05 10 0 -10
  [3,16,9,0,0.84,9,0,-5.05,10,0,-10],
// 3 16 -4.21 0 1.19 -2.53 0 0.28 -2.39 0 2.25
  [3,16,-4.21,0,1.19,-2.53,0,0.28,-2.39,0,2.25],
// 4 14 1.68 0 3.09 3.09 0 4.07 -0.14 0 3.79 -0.42 0 2.95
  [4,14,1.68,0,3.09,3.09,0,4.07,-0.14,0,3.79,-0.42,0,2.95],
// 4 14 1.72 0 -0.68 3.02 0 -1.69 1.68 0 1.26 0.84 0 1.12
  [4,14,1.72,0,-0.68,3.02,0,-1.69,1.68,0,1.26,0.84,0,1.12],
// 4 16 0.84 0 1.12 1.68 0 3.09 -0.42 0 2.95 -2.39 0 2.25
  [4,16,0.84,0,1.12,1.68,0,3.09,-0.42,0,2.95,-2.39,0,2.25],
// 4 14 -2.04 0 -1.82 -2.54 0 -3.55 -0.14 0 -1.4 -0.28 0 -0.42
  [4,14,-2.04,0,-1.82,-2.54,0,-3.55,-0.14,0,-1.4,-0.28,0,-0.42],
// 3 16 0.84 0 1.12 -0.28 0 -0.42 1.72 0 -0.68
  [3,16,0.84,0,1.12,-0.28,0,-0.42,1.72,0,-0.68],
// 4 14 -4.21 0 1.19 -5.98 0 1.19 -3.23 0 -0.42 -2.53 0 0.28
  [4,14,-4.21,0,1.19,-5.98,0,1.19,-3.23,0,-0.42,-2.53,0,0.28],
// 3 16 -0.28 0 -0.42 -2.53 0 0.28 -2.04 0 -1.82
  [3,16,-0.28,0,-0.42,-2.53,0,0.28,-2.04,0,-1.82],
// 4 14 -2.03 0 4.36 -2.53 0 5.89 -3.23 0 2.81 -2.39 0 2.25
  [4,14,-2.03,0,4.36,-2.53,0,5.89,-3.23,0,2.81,-2.39,0,2.25],
// 3 16 -0.42 0 2.95 -2.03 0 4.36 -2.39 0 2.25
  [3,16,-0.42,0,2.95,-2.03,0,4.36,-2.39,0,2.25],
// 3 16 10 0 -10 9 0 -7.16 9 0 -9
  [3,16,10,0,-10,9,0,-7.16,9,0,-9],
// 3 16 7.02 0 -9 0.7 0 -9 10 0 -10
  [3,16,7.02,0,-9,0.7,0,-9,10,0,-10],
// 3 3 9 0 -7.16 7.02 0 -9 9 0 -9
  [3,3,9,0,-7.16,7.02,0,-9,9,0,-9],
// 3 16 9 0 -9 7.02 0 -9 10 0 -10
  [3,16,9,0,-9,7.02,0,-9,10,0,-10],
];
module ldraw_lib__3070bp0s(step=0, col=false, unit=2/5, alt=false, line=0.2, solid=!$preview)
    makepoly(ldraw_lib__3070bp0s(solid), step=step, col=col, unit=unit, alt=alt, line=line, solid=solid);
ldraw_lib__3070bp0s(line=0.2);
